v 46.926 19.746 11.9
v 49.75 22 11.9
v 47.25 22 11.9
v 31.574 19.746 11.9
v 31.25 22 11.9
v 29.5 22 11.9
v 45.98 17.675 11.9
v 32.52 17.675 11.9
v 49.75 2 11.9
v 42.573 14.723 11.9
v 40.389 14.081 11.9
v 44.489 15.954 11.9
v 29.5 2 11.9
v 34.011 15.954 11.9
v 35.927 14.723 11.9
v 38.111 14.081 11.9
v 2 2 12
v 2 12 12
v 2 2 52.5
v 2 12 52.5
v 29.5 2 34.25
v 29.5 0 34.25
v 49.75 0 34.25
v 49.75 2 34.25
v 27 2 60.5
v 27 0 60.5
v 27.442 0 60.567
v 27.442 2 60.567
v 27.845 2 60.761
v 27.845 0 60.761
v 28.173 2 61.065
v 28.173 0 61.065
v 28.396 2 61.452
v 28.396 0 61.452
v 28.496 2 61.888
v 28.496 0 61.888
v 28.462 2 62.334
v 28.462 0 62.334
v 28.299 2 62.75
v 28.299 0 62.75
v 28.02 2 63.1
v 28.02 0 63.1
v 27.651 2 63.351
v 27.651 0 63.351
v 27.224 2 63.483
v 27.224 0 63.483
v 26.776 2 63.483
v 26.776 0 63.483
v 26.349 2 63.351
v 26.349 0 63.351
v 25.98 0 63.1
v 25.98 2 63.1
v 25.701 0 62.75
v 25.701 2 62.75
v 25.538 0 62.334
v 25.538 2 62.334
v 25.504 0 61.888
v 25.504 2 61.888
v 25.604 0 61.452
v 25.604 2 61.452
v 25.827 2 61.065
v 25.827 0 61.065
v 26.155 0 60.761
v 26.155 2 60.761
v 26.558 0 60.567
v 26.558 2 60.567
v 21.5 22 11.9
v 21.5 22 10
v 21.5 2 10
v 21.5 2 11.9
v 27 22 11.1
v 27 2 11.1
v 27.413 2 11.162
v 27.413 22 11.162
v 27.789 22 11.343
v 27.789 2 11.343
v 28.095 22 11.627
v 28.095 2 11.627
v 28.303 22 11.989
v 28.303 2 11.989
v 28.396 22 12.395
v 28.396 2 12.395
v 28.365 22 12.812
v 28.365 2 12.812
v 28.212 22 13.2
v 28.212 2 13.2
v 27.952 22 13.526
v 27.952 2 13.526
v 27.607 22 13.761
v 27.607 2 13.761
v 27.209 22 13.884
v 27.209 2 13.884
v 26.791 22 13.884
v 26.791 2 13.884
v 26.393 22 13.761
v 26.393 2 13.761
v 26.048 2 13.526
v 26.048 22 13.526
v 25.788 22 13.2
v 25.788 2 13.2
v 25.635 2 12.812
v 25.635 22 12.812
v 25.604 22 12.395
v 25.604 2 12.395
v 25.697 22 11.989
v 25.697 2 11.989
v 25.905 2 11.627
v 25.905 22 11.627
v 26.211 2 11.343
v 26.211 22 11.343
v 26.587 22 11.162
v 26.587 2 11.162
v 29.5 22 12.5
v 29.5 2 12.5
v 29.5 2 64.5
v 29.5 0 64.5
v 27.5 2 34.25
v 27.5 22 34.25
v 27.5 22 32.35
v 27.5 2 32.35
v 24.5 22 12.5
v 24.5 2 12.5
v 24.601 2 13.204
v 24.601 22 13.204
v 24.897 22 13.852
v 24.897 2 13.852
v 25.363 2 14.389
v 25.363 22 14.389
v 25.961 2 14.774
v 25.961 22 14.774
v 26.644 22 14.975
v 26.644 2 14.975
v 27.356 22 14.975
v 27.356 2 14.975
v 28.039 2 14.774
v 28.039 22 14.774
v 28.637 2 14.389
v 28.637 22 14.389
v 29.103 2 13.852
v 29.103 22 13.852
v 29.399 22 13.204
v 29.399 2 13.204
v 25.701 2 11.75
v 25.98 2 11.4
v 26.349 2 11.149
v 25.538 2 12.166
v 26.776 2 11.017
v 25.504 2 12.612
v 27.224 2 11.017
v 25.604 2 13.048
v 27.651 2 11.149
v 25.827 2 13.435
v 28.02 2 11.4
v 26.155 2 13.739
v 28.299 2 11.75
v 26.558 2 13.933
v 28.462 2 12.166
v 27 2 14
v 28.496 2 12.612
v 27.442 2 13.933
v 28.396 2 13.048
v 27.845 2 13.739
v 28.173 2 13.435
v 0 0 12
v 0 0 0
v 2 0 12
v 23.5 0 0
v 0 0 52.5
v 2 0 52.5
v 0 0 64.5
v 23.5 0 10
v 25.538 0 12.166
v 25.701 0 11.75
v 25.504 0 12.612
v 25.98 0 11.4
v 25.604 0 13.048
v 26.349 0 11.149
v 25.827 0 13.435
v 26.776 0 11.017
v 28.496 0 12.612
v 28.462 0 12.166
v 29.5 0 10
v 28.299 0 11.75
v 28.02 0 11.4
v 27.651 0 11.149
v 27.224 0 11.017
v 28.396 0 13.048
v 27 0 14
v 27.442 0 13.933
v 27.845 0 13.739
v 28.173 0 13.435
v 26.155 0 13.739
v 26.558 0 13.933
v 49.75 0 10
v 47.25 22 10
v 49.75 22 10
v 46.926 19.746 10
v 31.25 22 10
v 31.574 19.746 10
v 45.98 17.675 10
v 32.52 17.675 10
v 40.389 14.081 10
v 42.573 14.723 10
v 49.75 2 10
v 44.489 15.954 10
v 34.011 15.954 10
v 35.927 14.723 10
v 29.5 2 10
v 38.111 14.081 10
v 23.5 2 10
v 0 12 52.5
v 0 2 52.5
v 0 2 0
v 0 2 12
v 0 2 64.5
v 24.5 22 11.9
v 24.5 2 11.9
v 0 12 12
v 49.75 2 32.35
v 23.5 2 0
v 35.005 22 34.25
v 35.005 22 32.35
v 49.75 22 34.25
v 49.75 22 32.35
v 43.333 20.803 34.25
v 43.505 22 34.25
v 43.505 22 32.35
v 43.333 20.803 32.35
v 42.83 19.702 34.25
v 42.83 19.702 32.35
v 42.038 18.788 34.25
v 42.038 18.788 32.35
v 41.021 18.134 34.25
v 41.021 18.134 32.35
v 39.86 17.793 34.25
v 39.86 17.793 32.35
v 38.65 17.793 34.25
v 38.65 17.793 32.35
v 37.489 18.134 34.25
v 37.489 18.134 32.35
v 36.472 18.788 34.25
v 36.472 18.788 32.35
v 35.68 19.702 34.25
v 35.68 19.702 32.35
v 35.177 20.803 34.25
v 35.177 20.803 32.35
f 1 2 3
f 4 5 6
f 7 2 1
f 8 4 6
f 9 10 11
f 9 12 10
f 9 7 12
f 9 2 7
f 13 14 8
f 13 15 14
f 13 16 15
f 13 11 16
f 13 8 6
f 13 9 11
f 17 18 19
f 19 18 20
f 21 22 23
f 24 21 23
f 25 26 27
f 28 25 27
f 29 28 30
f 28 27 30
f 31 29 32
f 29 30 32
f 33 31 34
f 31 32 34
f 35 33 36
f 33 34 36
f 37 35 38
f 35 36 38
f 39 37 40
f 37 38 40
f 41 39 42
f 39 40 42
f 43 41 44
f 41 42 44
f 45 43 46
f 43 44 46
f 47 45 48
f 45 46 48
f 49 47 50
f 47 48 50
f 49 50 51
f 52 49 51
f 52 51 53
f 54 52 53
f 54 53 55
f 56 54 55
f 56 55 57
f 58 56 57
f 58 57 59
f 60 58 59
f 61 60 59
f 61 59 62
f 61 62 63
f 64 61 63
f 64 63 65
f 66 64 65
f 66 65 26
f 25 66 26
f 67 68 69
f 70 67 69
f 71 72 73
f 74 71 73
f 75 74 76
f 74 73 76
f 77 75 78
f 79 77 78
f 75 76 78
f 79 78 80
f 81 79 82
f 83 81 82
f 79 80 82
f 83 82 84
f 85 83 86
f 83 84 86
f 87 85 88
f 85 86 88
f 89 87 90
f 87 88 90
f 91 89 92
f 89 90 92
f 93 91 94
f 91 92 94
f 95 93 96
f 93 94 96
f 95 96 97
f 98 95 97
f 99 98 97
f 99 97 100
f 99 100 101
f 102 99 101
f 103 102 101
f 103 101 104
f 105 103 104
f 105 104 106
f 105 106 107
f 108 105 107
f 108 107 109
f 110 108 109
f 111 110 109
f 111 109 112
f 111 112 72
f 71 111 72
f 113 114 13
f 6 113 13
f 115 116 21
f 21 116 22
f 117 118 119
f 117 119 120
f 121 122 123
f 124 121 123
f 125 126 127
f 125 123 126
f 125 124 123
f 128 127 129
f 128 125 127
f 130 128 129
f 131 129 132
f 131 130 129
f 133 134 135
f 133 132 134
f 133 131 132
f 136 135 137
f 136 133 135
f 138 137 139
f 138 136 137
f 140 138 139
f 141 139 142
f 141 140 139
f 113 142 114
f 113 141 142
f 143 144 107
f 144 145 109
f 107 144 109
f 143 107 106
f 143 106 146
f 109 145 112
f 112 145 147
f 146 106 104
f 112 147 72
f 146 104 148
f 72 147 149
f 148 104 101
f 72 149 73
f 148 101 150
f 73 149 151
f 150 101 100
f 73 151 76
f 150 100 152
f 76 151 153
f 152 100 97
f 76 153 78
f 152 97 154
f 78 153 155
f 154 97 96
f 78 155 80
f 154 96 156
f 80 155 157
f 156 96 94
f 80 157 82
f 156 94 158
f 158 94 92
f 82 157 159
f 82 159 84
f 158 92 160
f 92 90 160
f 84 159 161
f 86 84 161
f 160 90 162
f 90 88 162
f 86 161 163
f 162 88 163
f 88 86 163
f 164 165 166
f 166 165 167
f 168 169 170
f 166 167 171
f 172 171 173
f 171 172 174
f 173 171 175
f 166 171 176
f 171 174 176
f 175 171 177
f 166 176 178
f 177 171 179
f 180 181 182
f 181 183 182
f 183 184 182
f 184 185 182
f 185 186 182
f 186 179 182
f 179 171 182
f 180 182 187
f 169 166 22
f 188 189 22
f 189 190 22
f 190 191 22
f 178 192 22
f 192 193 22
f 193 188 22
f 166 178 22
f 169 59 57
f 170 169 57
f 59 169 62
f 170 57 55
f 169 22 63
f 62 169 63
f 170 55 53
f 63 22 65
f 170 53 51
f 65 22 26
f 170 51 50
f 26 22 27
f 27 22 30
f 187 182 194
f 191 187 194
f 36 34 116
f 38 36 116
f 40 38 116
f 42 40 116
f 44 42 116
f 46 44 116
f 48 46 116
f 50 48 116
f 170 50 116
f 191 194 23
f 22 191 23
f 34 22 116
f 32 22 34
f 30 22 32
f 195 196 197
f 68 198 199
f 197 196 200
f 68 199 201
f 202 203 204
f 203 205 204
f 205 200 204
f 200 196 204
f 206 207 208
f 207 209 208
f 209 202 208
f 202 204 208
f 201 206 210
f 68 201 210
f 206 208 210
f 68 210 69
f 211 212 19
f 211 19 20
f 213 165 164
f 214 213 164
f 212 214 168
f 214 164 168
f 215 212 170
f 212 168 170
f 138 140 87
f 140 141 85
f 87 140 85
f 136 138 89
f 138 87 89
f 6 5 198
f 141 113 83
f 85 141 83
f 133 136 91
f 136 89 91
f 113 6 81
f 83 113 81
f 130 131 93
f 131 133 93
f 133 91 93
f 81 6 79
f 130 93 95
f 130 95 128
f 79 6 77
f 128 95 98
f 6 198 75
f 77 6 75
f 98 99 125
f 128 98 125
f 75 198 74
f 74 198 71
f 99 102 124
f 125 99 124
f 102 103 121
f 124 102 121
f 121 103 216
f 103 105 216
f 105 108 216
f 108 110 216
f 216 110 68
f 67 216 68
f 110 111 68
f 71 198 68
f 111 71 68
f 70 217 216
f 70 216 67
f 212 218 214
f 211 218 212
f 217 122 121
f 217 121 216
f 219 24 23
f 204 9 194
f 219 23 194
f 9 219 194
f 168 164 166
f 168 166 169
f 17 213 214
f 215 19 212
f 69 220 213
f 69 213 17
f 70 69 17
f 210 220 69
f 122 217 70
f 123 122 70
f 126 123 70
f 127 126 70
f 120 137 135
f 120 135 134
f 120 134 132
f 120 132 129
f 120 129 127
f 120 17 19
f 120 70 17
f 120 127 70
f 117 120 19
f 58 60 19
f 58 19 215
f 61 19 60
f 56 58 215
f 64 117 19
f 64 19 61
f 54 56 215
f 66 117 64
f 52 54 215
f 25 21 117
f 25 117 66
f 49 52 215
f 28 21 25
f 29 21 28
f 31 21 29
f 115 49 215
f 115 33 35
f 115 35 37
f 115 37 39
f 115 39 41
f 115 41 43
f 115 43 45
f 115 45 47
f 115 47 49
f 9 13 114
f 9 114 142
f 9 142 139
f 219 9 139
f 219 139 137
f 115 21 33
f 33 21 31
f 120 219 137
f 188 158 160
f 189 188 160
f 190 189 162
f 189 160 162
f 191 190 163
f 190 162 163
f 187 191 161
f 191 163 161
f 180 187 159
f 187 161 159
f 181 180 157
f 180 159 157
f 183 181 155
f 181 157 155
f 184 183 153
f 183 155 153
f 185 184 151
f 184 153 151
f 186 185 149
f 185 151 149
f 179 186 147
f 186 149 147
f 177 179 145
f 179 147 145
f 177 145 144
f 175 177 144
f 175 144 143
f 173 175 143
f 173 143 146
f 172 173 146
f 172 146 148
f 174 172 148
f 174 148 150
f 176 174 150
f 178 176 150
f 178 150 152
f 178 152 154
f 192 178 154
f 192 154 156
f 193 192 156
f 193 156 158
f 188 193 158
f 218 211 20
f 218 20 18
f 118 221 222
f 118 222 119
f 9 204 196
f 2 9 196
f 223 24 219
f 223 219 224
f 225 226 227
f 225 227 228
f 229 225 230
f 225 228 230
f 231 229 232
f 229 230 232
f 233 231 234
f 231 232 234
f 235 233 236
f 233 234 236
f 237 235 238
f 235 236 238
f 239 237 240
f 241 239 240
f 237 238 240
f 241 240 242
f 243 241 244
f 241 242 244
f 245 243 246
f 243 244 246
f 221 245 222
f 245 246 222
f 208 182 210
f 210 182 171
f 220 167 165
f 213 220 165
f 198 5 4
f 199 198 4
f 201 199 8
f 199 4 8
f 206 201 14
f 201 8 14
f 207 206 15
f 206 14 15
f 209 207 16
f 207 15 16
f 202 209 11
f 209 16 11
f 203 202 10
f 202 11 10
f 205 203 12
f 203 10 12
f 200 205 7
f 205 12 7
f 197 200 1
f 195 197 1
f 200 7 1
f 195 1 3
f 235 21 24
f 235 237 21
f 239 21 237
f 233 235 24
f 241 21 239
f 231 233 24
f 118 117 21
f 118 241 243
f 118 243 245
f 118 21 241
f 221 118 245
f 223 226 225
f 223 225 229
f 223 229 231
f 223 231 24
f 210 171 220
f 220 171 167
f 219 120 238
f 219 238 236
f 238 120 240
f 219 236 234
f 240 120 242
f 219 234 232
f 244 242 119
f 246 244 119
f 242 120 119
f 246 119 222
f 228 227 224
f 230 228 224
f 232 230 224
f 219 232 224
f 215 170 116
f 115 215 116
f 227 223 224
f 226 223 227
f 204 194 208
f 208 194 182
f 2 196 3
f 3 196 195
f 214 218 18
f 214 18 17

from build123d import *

# Parameters (mm, degrees)
BOSS_EXTRUDE1_DEPTH                 = 2
BOSS_EXTRUDE1_2_DEPTH               = 2
BOSS_EXTRUDE2_DEPTH                 = 1.9
BOSS_EXTRUDE3_DEPTH                 = 1.9
F_16_0MM_DOWEL_HOLE1_D              = 16
F_16_0MM_DOWEL_HOLE1_DEPTH          = 1.9
BOSS_EXTRUDE4_DEPTH                 = 2
F_8_0MM_DOWEL_HOLE1_D               = 8.5
SKETCH10_W                          = 5
SKETCH10_H                          = 3.1
BOSS_EXTRUDE5_DEPTH                 = 20
F_3_0MM_DOWEL_HOLE1_D               = 2.8
F_3_0MM_DOWEL_HOLE1_DEPTH           = 20
F_5_0MM_DOWEL_HOLE1_D               = 3
F_5_0MM_DOWEL_HOLE1_DEPTH           = 2
F_5_0MM_DOWEL_HOLE1_ON_FACE_2_D     = 3
F_5_0MM_DOWEL_HOLE1_ON_FACE_2_DEPTH = 2
FILLET1_RADIUS                      = 2.5
FILLET1_LENGTH                      = 20


with BuildPart() as part:
    # 3DSketch1 → Boss-Extrude1 (new body)
    with BuildSketch(Plane(origin=(0, 0, 0), x_dir=(0.4159263542190885, 0, 0.9093982999027529), z_dir=(0, 1, 0))):
        Polygon((9.774269324, 21.370860048), (0, 0), (58.656190344, -26.827249847), (70.926017793, 0), (43.416719221, 12.581772215), (21.363810448, 22.667986305), (18.868252323, 17.211596506), align=None)
    extrude(amount=BOSS_EXTRUDE1_DEPTH)



with BuildPart() as body_2:
    # 3DSketch1 → Boss-Extrude1 2 (new body)
    with BuildSketch(Plane(origin=(0, 0, 0), x_dir=(0.4159263542190885, 0, 0.9093982999027529), z_dir=(0, 1, 0))):
        Polygon((21.363810448, 22.667986305), (43.416719221, 12.581772215), (51.839227894, 30.997087788), (29.786319121, 41.083301878), align=None)
    extrude(amount=BOSS_EXTRUDE1_2_DEPTH)


with BuildPart() as part_1:
    add(part.part)

    add(body_2.part)  # Boss-Extrude2 merges body 2
    # 3DSketch2 → Boss-Extrude2 (add)
    with BuildSketch(Plane(origin=(27.5, 0, 34.25), x_dir=(0.7110903860866081, 0.7031006064676654, 0), z_dir=(0, 0, 1))):
        Polygon((0, 0), (15.82176109, -15.643988494), (31.289974433, 0), (15.468213342, 15.643988494), align=None)
    extrude(amount=-BOSS_EXTRUDE2_DEPTH)

    # 3DSketch3 → Boss-Extrude3 (add)
    with BuildSketch(Plane(origin=(21.5, 0, 10), x_dir=(0.7889761107100116, 0.6144238738272655, 0), z_dir=(0, 0, -1))):
        Polygon((0, 0), (22.288575128, 17.357474436), (35.805900352, 0), (13.517325224, -17.357474436), align=None)
    extrude(amount=-BOSS_EXTRUDE3_DEPTH)

    # Ø16.0mm Dowel Hole1
    with Locations(Plane(origin=(39.25, 22, 10), x_dir=(-1, 0, 0), z_dir=(0, 0, -1))):
        with Locations((0, 0)):
            Hole(F_16_0MM_DOWEL_HOLE1_D / 2, depth=F_16_0MM_DOWEL_HOLE1_DEPTH)

    # 3DSketch7 → Boss-Extrude4 (add)
    with BuildSketch(Plane(origin=(0, 0, 52.5), x_dir=(0, 0.2840883296913741, -0.9587981127083872), z_dir=(1, 0, 0))):
        Polygon((0, 0), (3.409059956, 11.505577353), (42.240383521, 0), (38.831323565, -11.505577353), align=None)
    extrude(amount=BOSS_EXTRUDE4_DEPTH)

    # Ø8.0mm Dowel Hole1 (through all)
    with Locations(Plane(origin=(39.255, 22, 34.25), x_dir=(1, 0, 0), z_dir=(0, 0, 1))):
        with Locations((0, 0)):
            Hole(F_8_0MM_DOWEL_HOLE1_D / 2)

    # Sketch10 → Boss-Extrude5 (add)
    with BuildSketch(Plane(origin=(0, 2, 0), x_dir=(1, 0, 0), z_dir=(0, 1, 0))):
        with Locations((27, -13.45)):
            Rectangle(SKETCH10_W, SKETCH10_H)
    extrude(amount=BOSS_EXTRUDE5_DEPTH)

    # Ø3.0mm Dowel Hole1
    with Locations(Plane(origin=(27, 22, 12.5), x_dir=(0, 0, 1), z_dir=(0, 1, 0))):
        with Locations((0, 0)):
            Hole(F_3_0MM_DOWEL_HOLE1_D / 2, depth=F_3_0MM_DOWEL_HOLE1_DEPTH)

    # Ø5.0mm Dowel Hole1
    with Locations(Plane(origin=(27, 0, 12.5), x_dir=(0, 0, -1), z_dir=(0, -1, 0))):
        with Locations((0, 0)):
            Hole(F_5_0MM_DOWEL_HOLE1_D / 2, depth=F_5_0MM_DOWEL_HOLE1_DEPTH)

    # Ø5.0mm Dowel Hole1 on face 2
    with Locations(Plane(origin=(27, 2, 62), x_dir=(0, 0, 1), z_dir=(0, 1, 0))):
        with Locations((0, 0)):
            Hole(F_5_0MM_DOWEL_HOLE1_ON_FACE_2_D / 2, depth=F_5_0MM_DOWEL_HOLE1_ON_FACE_2_DEPTH)

    # Fillet1: full round fillet: the end face becomes a half cylinder, R = half its width
    fillet1_face = Plane((27, 12, 15), x_dir=(0, 1, 0), z_dir=(0, 0, 1))  # on the end face: x along it, z out of the body
    fillet1_slab = fillet1_face.offset(-FILLET1_RADIUS / 2) * Box(FILLET1_LENGTH, 2 * FILLET1_RADIUS, FILLET1_RADIUS, mode=Mode.PRIVATE)  # the body's end, R deep
    fillet1_round = Plane((27, 12, 12.5), x_dir=(0, 0, 1), z_dir=(0, 1, 0)) * Cylinder(FILLET1_RADIUS, FILLET1_LENGTH, mode=Mode.PRIVATE)  # its axis R under the face
    add(fillet1_slab - fillet1_round, mode=Mode.SUBTRACT)


solid = part_1.part
